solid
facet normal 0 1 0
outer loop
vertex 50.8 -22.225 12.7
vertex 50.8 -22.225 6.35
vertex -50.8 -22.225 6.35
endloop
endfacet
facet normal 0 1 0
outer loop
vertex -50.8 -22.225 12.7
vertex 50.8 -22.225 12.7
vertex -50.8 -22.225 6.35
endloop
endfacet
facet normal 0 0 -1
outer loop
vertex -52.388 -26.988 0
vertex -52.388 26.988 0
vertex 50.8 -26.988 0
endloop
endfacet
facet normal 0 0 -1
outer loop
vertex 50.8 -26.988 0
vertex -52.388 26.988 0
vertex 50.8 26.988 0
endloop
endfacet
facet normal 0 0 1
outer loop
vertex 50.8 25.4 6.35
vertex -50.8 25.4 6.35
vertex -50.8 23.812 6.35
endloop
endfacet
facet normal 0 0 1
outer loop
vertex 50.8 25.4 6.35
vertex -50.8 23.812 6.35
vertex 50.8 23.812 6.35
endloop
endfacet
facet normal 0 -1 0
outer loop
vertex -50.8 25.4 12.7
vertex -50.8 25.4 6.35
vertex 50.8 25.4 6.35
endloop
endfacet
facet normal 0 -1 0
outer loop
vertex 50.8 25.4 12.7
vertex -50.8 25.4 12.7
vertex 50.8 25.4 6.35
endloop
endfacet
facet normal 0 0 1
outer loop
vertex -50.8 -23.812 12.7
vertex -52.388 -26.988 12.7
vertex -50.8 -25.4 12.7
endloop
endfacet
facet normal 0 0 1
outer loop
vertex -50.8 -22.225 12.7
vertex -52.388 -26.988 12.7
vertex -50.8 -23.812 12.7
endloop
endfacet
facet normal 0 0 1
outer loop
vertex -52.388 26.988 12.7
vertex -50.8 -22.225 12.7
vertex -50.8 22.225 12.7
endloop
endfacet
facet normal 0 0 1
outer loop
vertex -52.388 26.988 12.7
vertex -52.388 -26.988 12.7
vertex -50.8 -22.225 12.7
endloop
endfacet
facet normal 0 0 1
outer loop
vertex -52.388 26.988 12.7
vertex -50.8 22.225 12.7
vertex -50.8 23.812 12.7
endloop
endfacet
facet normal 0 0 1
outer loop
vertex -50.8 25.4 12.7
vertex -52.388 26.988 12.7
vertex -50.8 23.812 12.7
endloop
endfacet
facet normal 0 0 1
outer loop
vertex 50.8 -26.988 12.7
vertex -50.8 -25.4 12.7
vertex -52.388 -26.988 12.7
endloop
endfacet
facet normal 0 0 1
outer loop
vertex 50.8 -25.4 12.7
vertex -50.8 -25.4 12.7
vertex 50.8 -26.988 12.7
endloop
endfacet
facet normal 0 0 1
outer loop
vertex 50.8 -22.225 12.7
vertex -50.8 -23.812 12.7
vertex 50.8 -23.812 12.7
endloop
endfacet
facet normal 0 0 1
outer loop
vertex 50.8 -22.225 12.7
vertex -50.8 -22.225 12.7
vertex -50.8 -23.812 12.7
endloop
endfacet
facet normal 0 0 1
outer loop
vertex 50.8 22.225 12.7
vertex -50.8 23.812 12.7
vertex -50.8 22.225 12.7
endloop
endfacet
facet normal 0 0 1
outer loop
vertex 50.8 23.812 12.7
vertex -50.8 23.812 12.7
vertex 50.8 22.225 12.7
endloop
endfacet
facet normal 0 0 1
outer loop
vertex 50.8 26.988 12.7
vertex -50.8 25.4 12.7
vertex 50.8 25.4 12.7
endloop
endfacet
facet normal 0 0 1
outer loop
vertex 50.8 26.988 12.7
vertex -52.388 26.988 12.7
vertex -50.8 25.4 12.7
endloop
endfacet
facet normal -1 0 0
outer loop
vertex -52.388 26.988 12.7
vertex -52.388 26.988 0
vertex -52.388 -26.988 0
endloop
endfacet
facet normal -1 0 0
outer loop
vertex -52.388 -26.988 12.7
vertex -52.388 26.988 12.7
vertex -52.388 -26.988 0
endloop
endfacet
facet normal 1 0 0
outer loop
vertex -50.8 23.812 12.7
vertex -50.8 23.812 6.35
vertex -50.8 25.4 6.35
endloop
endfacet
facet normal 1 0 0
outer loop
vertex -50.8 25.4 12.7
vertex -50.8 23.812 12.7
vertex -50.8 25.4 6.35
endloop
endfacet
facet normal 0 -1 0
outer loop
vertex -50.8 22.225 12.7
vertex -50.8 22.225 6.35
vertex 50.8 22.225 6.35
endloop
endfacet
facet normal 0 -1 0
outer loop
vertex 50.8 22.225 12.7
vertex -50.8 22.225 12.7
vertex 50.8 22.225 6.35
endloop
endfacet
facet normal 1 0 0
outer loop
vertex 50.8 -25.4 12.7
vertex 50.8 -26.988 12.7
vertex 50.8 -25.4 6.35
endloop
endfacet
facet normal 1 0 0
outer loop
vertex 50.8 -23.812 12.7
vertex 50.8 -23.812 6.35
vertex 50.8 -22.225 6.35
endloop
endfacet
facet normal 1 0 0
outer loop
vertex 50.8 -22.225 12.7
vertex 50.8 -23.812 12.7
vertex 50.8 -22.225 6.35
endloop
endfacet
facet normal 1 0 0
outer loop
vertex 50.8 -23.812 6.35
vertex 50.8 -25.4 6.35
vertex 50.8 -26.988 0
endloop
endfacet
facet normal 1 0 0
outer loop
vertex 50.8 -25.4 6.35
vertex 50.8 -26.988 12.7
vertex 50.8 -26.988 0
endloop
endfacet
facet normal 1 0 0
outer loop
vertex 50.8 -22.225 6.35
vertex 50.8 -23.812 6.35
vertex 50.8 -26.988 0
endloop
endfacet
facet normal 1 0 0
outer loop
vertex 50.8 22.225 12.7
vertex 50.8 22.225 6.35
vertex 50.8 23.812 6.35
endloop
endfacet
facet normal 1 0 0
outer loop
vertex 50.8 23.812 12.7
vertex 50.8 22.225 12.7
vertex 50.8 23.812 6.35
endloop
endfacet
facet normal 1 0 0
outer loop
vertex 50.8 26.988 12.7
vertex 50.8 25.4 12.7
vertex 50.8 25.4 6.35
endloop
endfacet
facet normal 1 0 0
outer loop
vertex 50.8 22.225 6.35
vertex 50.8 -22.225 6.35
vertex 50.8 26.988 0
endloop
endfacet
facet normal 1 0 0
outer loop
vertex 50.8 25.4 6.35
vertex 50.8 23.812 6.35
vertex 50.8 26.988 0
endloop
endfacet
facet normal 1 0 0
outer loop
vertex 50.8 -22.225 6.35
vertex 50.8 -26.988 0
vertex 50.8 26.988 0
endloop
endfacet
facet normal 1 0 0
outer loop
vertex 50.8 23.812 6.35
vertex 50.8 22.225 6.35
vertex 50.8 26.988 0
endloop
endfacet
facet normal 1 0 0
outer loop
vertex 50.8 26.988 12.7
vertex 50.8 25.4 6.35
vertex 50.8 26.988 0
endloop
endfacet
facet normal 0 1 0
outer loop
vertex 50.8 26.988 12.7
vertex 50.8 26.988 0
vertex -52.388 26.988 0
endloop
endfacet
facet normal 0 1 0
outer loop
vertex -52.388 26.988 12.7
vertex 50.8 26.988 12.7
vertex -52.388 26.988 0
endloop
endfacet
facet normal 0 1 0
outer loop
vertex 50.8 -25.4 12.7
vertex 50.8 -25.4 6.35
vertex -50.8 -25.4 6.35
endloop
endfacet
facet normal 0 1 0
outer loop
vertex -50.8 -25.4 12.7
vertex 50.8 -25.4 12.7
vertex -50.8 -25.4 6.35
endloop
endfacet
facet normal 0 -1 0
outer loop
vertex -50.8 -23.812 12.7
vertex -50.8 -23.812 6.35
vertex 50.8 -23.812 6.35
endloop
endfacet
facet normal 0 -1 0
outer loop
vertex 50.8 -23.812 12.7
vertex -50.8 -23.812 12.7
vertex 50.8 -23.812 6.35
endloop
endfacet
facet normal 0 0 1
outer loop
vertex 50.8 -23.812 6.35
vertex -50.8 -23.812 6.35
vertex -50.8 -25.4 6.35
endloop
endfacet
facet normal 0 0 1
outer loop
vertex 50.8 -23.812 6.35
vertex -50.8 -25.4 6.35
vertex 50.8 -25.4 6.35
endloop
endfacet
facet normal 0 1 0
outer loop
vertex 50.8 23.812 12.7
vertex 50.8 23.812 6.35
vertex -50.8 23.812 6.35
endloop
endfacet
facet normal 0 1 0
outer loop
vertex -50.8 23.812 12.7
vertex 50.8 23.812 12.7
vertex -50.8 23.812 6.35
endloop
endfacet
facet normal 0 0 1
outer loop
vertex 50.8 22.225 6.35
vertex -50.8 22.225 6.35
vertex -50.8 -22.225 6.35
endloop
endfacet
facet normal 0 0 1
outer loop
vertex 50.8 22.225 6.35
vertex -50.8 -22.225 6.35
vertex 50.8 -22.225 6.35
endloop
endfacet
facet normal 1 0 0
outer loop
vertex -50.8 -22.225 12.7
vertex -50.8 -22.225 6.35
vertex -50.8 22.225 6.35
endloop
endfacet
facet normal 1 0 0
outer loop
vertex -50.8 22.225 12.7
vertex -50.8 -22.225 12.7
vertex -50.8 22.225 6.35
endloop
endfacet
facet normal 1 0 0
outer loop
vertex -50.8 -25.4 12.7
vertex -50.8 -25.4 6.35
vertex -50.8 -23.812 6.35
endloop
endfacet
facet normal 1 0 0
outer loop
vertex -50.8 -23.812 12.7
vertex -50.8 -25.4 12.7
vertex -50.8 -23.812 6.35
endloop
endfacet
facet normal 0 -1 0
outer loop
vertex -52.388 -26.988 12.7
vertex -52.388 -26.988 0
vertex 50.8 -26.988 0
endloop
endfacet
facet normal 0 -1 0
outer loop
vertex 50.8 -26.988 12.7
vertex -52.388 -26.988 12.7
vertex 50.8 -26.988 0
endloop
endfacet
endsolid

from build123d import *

# Parameters (mm, degrees)
F0_W     = 101.6
F0_H     = 50.8
F1_DEPTH = 6.35
F3_DEPTH = 12.7


with BuildPart() as f1:
    # F0 (on Top) → F1 (new body)
    with BuildSketch(Plane.XY):
        Rectangle(F0_W, F0_H)
    extrude(amount=F1_DEPTH)

    # F2 (on Top) → F3 (join)
    with BuildSketch(Plane.XY):
        Polygon((50.8, 25.4), (50.8, 26.9875), (-52.3875, 26.9875), (-52.3875, -26.9875), (50.8, -26.9875), (50.8, -25.4), (-50.8, -25.4), (-50.8, -23.8125), (50.8, -23.8125), (50.8, -22.225), (-50.8, -22.225), (-50.8, 22.225), (50.8, 22.225), (50.8, 23.8125), (-50.8, 23.8125), (-50.8, 25.4), align=None)
    extrude(amount=F3_DEPTH)


solid = f1.part
